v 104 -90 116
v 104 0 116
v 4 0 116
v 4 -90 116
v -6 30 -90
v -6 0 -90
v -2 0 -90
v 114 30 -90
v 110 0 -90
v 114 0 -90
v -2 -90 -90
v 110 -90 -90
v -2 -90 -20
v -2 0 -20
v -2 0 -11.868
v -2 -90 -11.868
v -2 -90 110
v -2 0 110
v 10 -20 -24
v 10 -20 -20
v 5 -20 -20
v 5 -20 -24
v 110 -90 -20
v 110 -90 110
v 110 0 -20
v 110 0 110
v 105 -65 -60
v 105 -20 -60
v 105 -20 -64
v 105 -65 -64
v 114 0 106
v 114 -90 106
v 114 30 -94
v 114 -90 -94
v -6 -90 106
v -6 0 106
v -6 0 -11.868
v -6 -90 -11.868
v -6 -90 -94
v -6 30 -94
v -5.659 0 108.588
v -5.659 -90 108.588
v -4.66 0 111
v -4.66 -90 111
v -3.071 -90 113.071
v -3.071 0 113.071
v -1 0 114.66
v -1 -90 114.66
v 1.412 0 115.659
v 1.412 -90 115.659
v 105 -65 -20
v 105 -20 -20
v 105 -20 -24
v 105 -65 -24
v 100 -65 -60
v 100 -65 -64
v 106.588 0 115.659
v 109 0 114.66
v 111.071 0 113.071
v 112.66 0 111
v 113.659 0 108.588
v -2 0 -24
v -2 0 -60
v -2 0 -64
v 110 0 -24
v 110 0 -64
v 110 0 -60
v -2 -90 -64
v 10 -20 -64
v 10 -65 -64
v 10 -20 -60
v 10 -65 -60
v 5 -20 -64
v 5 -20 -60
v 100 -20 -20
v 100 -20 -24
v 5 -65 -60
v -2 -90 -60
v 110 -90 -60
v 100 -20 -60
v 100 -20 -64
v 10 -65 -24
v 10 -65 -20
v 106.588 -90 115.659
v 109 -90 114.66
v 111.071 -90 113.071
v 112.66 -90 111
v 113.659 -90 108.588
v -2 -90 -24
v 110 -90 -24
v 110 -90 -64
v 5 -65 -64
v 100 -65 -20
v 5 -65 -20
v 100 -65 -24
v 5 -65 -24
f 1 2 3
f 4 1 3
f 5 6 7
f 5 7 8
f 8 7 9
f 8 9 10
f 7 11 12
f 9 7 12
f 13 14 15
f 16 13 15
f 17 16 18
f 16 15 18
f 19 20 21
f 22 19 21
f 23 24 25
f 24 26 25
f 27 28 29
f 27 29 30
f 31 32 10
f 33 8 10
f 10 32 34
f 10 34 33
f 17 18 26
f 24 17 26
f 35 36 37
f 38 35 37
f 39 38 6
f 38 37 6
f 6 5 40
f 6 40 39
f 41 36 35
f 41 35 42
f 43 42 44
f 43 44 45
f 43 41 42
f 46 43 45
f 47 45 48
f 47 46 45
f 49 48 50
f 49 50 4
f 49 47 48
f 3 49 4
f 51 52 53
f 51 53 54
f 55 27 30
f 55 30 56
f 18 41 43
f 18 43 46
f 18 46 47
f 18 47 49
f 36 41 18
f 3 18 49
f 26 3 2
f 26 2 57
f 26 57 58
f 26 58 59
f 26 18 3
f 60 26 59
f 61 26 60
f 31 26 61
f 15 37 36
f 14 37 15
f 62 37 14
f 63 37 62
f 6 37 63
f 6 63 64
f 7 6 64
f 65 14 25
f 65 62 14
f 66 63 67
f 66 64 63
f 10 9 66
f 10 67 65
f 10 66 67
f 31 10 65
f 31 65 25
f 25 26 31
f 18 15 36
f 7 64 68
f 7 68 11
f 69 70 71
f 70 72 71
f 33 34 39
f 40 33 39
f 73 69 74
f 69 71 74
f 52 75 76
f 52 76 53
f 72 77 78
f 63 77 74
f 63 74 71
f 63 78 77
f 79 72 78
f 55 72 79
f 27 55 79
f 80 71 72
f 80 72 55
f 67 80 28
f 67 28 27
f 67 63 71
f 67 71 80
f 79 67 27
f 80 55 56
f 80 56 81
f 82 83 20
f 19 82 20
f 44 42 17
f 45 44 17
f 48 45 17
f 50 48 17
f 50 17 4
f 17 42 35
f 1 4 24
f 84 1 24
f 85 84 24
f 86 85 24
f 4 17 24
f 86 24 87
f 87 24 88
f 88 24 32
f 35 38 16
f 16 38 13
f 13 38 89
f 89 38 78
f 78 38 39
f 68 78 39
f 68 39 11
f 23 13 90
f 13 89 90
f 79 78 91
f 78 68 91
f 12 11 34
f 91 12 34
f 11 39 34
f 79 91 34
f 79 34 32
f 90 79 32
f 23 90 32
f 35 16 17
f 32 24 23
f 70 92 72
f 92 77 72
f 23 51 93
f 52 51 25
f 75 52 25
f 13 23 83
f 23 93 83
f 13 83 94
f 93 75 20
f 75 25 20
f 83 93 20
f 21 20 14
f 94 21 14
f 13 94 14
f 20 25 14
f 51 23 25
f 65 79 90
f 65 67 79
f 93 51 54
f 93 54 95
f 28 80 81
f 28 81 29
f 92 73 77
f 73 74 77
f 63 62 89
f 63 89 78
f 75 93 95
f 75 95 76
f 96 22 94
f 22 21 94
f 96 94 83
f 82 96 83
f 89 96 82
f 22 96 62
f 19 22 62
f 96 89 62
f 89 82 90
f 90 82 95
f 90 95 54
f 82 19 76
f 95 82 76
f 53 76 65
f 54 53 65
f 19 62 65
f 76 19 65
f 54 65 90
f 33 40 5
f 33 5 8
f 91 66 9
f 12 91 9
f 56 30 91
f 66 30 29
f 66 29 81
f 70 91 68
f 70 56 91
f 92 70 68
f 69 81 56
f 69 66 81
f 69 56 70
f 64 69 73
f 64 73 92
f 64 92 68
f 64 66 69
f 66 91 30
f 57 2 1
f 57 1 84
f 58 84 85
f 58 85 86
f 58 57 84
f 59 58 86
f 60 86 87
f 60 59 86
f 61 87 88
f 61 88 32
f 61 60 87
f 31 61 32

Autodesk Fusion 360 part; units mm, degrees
sketch "Sketch1" plane through (0, 0, 0) normal (0, 1, 0) x (1, 0, 0)
  line L0 (25, -92) -> (83, -92)
  line L1 (83, -92) -> (83, 0)
  line L2 (83, 0) -> (25, 0)
  line L3 (54, -92) -> (25, -92)
  line L4 (54, -92) -> (83, -92)
  line L5 (-6, -92) -> (-6, 24)
  line L6 (-6, 24) -> (114, 24)
  line L7 (114, 24) -> (114, -106)
  line L8 (104, -116) -> (4, -116)
  line L9 (-6, -106) -> (-6, -92)
  line L10 (25, -92) -> (25, 0)
  arc A0 (104, -116) -> (114, -106) centre (104, -106) ccw
  arc A1 (-6, -106) -> (4, -116) centre (4, -106) ccw
  line L11 (110, -110) -> (110, 20)
  line L12 (-6, 11.8684) -> (-2, 11.8684)
  line L13 (110, 20) -> (-2, 20)
  line L14 (-2, 20) -> (-2, -110)
  line L15 (-2, -110) -> (110, -110)
  dimension "d1" = 92
  dimension "d3" = 60
  dimension "d7" = 10
  dimension "d8" = 10
sketch "Sketch2" plane through (0, 0, 0) normal (0, 1, 0) x (1, 0, 0)
  line L0 (114, 24) -> (114, 64)
  line L1 (114, 64) -> (-6, 64)
  line L2 (-6, 64) -> (-6, 24)
  line L3 (-2, 24) -> (-2, 60)
  line L4 (-2, 60) -> (110, 60)
  line L5 (110, 60) -> (110, 24)
  line L6 (114, 24) -> (110, 24)
  line L7 (-2, 24) -> (-6, 24)
  line L8 (114, 64) -> (114, 94)
  line L9 (114, 94) -> (-6, 94)
  line L10 (-6, 94) -> (-6, 64)
  line L11 (-2, 64) -> (-2, 90)
  line L12 (110, 64) -> (110, 90)
  line L13 (110, 90) -> (-2, 90)
  line L14 (110, 90) -> (114, 90)
  line L15 (-2, 90) -> (-6, 90)
  dimension "d13" = 40
  dimension "d18" = 30
  dimension "d19" = 26
  dimension "d20" = 26
sketch "Sketch3" plane through (0, 0, -20) normal (0, 0, 1) x (-1, 0, 0)
  line L0 (-110, 0) -> (2, 0)
  line L1 (2, 0) -> (2, 90)
  line L2 (2, 90) -> (-110, 90)
  line L3 (-110, 90) -> (-110, 0)
  line L4 (-35, 65) -> (-80, 65)
  line L5 (-80, 65) -> (-80, 75)
  line L6 (-80, 75) -> (-35, 75)
  line L7 (-35, 75) -> (-35, 65)
sketch "Sketch4" plane through (0, 1.5, 0) normal (0, 1, 0) x (-1, 0, 0)
  line L0 (-83, 92) -> (-25, 92)
  line L1 (-25, 92) -> (-25, 0)
  line L2 (-25, 0) -> (-83, 0)
  line L3 (-83, 0) -> (-83, 92)
  line L4 (2, 110) -> (-110, 110)
  line L5 (-110, 110) -> (-110, -20)
  line L6 (-110, -20) -> (2, -20)
  line L7 (2, -20) -> (2, 110)
extrude "Extrude6" add sketch "Sketch1" against normal blind 1.5 contours L11 L13 L14 L15
extrude "Extrude7" add sketch "Sketch1" sketch "Sketch2" against normal blind 90 contours L5 L6 L7 L8 L9 A0 A1 of sketch 2 contours L0 L1 L2 L3 L4 L5 L6 L7 | L1 L8 L12 L14 | L8 L9 L10 L13 L14 L15 | L1 L10 L11 L15
extrude "Extrude8" add sketch "Sketch2" along normal blind 30 contours L8 L9 L10 L13 L14 L15
sketch "Sketch5" plane through (0, 0, -20) normal (0, 0, 1) x (-1, 0, 0)
  line L0 (-110, 1.5) -> (2, 1.5)
  line L1 (2, 1.5) -> (2, 90)
  line L2 (2, 90) -> (-110, 90)
  line L3 (-110, 90) -> (-110, 1.5)
  line L4 (-5, 20) -> (-5, 65)
  line L5 (-5, 65) -> (-10, 65)
  line L6 (-10, 65) -> (-10, 20)
  line L7 (-10, 20) -> (-5, 20)
  line L8 (-105, 20) -> (-105, 65)
  line L9 (-105, 65) -> (-100, 65)
  line L10 (-100, 65) -> (-100, 20)
  line L11 (-100, 20) -> (-105, 20)
extrude "Extrude9" cut sketch "Sketch5" against normal blind 44 contours L4 L5 L6 L7 | L8 L9 L10 L11
sketch "Sketch6" plane through (0, 1.5, 0) normal (0, 1, 0) x (-1, 0, 0)
  circle A0 centre (-91.2, 46.0087) radius 1.5
  circle A1 centre (-14.7, 45.9255) radius 1.5
  dimension "d32" = 3
  dimension "d35" = 3
extrude "Extrude10" add sketch "Sketch4" against normal blind 3
extrude "Extrude11" cut sketch "Sketch6" against normal blind 3
extrude "Extrude12" cut 1 faces at (12.2549, 1.5, 83.0328) along direction (0, -1, 0) blind 3
